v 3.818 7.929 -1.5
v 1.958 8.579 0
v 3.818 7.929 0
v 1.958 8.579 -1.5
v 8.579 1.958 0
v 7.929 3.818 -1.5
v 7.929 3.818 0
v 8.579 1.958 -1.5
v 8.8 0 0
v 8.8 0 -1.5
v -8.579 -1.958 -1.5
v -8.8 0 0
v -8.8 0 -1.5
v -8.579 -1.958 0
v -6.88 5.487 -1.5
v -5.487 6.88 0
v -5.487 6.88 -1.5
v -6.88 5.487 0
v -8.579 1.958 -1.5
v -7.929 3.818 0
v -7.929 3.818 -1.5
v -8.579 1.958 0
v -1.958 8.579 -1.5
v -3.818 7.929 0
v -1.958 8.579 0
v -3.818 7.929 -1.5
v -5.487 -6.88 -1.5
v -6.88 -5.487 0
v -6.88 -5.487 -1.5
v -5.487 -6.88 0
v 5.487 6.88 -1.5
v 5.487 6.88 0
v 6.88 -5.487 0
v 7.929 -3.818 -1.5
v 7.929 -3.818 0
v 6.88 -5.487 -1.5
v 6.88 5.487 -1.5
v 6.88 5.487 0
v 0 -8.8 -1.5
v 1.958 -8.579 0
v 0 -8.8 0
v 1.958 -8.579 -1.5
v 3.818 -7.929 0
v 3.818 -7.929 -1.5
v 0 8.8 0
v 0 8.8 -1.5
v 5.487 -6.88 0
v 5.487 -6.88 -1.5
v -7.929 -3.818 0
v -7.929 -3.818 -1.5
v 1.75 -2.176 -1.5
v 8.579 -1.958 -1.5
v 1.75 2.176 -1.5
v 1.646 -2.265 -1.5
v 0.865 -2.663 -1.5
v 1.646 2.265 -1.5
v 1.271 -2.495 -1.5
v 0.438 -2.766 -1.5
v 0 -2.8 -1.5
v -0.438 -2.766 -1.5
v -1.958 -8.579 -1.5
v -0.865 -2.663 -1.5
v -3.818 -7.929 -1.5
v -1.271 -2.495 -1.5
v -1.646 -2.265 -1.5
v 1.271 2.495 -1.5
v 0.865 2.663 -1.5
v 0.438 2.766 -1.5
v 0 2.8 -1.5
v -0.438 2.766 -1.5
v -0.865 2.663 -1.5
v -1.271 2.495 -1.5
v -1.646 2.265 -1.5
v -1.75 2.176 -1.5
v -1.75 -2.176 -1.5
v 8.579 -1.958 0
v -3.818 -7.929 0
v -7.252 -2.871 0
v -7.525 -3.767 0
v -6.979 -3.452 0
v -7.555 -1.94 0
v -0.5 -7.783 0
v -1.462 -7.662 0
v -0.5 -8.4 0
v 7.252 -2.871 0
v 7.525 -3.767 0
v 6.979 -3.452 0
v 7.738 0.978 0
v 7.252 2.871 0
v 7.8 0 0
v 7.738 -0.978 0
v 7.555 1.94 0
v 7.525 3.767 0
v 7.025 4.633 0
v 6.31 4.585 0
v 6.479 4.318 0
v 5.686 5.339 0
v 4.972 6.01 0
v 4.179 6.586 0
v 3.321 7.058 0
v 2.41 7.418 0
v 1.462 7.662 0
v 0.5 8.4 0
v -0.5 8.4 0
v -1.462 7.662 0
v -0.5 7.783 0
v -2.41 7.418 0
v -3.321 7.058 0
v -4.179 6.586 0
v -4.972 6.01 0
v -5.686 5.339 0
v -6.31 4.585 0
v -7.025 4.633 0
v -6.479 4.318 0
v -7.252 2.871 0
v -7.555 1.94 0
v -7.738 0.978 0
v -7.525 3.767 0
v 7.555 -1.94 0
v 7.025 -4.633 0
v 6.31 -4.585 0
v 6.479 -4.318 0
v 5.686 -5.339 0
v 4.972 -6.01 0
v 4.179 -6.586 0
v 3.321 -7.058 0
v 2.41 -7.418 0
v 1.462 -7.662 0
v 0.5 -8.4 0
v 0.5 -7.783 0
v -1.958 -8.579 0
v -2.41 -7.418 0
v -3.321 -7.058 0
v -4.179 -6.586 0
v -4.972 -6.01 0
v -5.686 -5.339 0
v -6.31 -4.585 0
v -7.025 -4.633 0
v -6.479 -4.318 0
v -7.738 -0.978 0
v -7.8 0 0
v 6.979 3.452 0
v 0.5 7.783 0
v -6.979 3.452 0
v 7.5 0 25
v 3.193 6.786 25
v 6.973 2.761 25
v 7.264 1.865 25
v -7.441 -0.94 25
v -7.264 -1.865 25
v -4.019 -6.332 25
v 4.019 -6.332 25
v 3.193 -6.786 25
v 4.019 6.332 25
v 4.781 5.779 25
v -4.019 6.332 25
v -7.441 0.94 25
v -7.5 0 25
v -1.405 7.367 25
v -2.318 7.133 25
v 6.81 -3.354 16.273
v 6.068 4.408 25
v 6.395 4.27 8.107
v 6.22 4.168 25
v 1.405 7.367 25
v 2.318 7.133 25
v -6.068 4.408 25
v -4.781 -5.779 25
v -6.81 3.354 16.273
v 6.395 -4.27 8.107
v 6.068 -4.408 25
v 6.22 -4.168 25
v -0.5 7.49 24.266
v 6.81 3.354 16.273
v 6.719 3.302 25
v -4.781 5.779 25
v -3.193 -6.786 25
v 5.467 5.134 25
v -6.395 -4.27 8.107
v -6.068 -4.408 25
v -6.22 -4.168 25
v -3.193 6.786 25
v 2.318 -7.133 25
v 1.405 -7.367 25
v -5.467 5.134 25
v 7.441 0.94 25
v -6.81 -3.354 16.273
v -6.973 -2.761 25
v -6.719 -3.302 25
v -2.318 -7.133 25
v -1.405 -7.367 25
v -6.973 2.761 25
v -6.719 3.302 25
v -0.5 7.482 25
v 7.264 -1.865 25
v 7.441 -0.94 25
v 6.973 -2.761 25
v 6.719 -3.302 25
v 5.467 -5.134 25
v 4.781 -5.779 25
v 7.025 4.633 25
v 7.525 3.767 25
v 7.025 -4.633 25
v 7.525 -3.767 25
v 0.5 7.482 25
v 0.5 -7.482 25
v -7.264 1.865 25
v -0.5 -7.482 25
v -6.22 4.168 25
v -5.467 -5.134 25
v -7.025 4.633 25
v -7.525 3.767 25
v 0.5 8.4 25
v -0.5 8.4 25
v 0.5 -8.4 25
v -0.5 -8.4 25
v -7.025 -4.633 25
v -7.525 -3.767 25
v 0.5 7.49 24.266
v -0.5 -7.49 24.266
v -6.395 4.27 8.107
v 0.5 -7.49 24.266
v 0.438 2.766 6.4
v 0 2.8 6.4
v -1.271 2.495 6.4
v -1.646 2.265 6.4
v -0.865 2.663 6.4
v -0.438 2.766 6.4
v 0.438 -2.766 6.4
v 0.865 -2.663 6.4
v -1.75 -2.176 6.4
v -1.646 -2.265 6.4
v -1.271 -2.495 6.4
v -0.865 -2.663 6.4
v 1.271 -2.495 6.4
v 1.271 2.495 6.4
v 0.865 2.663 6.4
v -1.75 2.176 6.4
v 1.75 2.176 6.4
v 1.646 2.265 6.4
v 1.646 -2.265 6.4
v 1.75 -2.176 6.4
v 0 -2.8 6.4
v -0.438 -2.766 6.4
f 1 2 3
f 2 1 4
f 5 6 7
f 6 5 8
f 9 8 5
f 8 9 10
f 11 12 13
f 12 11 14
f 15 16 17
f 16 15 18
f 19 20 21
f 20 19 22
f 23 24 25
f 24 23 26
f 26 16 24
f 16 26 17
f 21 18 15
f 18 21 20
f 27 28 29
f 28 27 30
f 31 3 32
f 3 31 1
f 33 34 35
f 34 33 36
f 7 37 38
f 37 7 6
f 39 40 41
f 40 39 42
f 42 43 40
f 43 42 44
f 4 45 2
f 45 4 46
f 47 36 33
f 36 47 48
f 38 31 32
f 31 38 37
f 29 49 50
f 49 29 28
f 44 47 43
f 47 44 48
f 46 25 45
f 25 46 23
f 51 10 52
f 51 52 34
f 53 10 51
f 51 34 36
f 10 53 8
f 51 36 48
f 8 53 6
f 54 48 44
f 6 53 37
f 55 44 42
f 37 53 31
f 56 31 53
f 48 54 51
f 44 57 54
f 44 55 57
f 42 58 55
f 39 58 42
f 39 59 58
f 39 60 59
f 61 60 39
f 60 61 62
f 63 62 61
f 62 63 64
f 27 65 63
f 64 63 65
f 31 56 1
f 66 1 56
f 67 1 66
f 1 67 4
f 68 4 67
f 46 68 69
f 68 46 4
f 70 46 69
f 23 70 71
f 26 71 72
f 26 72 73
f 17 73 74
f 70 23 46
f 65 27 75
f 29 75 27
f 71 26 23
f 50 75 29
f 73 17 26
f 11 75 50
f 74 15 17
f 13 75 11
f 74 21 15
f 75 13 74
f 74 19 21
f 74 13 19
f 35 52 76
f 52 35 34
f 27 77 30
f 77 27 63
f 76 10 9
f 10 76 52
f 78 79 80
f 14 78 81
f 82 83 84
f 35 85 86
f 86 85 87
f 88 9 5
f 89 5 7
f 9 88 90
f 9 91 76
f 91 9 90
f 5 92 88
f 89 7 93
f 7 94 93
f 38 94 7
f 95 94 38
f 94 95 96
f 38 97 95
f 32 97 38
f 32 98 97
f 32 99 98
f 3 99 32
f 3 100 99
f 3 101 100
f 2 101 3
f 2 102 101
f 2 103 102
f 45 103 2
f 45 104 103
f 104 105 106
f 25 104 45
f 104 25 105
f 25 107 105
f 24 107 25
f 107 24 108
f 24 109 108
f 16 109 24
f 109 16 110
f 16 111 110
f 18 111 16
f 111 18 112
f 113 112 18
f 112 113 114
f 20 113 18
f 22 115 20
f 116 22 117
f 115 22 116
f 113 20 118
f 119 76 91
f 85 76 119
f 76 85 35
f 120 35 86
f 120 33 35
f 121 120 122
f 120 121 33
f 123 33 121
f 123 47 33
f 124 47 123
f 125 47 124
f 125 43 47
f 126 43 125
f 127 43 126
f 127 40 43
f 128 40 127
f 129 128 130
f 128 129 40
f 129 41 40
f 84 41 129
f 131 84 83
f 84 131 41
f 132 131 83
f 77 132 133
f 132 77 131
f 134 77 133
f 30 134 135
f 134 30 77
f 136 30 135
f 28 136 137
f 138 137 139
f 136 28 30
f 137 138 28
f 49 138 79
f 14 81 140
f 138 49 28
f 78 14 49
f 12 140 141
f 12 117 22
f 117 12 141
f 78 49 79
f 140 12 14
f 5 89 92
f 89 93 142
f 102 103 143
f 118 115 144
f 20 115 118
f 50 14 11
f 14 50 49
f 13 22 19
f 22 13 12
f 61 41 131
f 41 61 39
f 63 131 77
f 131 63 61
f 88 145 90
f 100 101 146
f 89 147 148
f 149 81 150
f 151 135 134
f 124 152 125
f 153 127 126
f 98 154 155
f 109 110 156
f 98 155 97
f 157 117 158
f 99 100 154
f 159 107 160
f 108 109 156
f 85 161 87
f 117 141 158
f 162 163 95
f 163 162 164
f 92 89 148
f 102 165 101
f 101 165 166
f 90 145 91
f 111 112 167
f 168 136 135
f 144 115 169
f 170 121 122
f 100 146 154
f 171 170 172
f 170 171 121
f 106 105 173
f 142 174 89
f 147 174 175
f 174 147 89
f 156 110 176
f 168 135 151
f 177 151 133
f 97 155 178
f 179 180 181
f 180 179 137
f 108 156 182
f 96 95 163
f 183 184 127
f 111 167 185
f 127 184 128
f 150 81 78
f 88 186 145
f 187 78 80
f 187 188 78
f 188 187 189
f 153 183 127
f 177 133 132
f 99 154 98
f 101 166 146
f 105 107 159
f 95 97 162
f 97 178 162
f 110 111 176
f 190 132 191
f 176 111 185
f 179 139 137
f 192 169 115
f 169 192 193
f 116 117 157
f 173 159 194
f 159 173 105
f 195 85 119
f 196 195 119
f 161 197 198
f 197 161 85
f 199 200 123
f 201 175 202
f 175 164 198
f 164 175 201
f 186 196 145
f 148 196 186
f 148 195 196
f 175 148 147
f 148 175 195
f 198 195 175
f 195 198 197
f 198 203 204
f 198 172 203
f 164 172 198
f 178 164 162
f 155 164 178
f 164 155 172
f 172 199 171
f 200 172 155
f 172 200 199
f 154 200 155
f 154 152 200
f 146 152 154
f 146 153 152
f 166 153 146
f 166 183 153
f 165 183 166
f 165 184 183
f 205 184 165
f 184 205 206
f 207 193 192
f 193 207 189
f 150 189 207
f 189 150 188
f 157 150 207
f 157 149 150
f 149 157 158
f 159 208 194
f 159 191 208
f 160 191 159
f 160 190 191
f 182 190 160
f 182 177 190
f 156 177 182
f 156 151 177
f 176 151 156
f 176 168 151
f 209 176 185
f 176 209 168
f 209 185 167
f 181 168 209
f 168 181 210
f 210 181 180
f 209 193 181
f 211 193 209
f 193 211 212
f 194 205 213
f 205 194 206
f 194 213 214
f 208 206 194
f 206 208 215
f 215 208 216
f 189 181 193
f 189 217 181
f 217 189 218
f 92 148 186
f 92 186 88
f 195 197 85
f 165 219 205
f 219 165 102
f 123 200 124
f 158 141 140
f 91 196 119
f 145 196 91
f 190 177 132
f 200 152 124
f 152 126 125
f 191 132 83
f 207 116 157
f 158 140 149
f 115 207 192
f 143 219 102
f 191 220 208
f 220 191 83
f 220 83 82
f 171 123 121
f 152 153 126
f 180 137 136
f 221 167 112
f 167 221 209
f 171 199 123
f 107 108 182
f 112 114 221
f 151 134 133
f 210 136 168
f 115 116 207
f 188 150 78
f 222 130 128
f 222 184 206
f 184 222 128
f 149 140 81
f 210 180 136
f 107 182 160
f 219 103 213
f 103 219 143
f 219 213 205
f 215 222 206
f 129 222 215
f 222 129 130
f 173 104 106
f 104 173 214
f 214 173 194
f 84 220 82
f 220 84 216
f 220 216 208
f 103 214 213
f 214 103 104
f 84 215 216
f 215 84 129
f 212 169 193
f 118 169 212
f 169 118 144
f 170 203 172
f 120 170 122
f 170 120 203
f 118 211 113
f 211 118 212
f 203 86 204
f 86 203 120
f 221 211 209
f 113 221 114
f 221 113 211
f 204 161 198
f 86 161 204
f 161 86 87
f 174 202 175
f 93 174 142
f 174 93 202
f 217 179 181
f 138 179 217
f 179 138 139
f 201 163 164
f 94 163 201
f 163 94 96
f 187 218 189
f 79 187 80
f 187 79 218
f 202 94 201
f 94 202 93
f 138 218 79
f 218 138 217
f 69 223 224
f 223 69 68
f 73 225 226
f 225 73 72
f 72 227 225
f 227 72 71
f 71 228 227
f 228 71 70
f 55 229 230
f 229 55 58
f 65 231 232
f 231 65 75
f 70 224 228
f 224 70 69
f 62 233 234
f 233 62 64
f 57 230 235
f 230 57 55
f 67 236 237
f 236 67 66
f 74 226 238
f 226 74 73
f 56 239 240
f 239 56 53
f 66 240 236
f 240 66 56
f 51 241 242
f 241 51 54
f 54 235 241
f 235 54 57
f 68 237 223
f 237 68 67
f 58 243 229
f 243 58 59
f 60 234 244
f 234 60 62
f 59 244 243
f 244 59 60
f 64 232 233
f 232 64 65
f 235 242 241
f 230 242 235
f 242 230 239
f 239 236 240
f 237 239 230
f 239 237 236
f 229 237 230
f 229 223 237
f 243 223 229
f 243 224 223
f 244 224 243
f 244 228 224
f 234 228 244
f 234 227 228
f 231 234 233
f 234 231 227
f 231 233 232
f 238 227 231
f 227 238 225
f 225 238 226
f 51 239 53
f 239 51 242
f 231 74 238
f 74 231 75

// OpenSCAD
d=15.6;
l=25;

// base
bd=d+2;
bl=1.5;

// shaft
sd=5.6;
sw=3.5;
sl=8;

difference()
{
	union()
	{
		translate([0, 0, -bl]) cylinder(h=bl, d=bd);
		translate([0, 0, 0]) cylinder(h=l, d1=d, d2=d-0.6, $fn=50);

		rotate([0, 0,  0]) translate([0, 0, l/2]) cube([1, d+1.2, l], center=true);
		rotate([0, 0, 60]) translate([0, 0, l/2]) cube([1, d+1.2, l], center=true);
		rotate([0, 0,-60]) translate([0, 0, l/2]) cube([1, d+1.2, l], center=true);
	}
	intersection()
	{
		translate([0, 0, -bl-0.1]) cylinder(h=sl, d=sd, $fn=40);
		translate([0, 0, sl/2-bl-0.1]) cube([sw, sd, sl], center=true);
	}
}
